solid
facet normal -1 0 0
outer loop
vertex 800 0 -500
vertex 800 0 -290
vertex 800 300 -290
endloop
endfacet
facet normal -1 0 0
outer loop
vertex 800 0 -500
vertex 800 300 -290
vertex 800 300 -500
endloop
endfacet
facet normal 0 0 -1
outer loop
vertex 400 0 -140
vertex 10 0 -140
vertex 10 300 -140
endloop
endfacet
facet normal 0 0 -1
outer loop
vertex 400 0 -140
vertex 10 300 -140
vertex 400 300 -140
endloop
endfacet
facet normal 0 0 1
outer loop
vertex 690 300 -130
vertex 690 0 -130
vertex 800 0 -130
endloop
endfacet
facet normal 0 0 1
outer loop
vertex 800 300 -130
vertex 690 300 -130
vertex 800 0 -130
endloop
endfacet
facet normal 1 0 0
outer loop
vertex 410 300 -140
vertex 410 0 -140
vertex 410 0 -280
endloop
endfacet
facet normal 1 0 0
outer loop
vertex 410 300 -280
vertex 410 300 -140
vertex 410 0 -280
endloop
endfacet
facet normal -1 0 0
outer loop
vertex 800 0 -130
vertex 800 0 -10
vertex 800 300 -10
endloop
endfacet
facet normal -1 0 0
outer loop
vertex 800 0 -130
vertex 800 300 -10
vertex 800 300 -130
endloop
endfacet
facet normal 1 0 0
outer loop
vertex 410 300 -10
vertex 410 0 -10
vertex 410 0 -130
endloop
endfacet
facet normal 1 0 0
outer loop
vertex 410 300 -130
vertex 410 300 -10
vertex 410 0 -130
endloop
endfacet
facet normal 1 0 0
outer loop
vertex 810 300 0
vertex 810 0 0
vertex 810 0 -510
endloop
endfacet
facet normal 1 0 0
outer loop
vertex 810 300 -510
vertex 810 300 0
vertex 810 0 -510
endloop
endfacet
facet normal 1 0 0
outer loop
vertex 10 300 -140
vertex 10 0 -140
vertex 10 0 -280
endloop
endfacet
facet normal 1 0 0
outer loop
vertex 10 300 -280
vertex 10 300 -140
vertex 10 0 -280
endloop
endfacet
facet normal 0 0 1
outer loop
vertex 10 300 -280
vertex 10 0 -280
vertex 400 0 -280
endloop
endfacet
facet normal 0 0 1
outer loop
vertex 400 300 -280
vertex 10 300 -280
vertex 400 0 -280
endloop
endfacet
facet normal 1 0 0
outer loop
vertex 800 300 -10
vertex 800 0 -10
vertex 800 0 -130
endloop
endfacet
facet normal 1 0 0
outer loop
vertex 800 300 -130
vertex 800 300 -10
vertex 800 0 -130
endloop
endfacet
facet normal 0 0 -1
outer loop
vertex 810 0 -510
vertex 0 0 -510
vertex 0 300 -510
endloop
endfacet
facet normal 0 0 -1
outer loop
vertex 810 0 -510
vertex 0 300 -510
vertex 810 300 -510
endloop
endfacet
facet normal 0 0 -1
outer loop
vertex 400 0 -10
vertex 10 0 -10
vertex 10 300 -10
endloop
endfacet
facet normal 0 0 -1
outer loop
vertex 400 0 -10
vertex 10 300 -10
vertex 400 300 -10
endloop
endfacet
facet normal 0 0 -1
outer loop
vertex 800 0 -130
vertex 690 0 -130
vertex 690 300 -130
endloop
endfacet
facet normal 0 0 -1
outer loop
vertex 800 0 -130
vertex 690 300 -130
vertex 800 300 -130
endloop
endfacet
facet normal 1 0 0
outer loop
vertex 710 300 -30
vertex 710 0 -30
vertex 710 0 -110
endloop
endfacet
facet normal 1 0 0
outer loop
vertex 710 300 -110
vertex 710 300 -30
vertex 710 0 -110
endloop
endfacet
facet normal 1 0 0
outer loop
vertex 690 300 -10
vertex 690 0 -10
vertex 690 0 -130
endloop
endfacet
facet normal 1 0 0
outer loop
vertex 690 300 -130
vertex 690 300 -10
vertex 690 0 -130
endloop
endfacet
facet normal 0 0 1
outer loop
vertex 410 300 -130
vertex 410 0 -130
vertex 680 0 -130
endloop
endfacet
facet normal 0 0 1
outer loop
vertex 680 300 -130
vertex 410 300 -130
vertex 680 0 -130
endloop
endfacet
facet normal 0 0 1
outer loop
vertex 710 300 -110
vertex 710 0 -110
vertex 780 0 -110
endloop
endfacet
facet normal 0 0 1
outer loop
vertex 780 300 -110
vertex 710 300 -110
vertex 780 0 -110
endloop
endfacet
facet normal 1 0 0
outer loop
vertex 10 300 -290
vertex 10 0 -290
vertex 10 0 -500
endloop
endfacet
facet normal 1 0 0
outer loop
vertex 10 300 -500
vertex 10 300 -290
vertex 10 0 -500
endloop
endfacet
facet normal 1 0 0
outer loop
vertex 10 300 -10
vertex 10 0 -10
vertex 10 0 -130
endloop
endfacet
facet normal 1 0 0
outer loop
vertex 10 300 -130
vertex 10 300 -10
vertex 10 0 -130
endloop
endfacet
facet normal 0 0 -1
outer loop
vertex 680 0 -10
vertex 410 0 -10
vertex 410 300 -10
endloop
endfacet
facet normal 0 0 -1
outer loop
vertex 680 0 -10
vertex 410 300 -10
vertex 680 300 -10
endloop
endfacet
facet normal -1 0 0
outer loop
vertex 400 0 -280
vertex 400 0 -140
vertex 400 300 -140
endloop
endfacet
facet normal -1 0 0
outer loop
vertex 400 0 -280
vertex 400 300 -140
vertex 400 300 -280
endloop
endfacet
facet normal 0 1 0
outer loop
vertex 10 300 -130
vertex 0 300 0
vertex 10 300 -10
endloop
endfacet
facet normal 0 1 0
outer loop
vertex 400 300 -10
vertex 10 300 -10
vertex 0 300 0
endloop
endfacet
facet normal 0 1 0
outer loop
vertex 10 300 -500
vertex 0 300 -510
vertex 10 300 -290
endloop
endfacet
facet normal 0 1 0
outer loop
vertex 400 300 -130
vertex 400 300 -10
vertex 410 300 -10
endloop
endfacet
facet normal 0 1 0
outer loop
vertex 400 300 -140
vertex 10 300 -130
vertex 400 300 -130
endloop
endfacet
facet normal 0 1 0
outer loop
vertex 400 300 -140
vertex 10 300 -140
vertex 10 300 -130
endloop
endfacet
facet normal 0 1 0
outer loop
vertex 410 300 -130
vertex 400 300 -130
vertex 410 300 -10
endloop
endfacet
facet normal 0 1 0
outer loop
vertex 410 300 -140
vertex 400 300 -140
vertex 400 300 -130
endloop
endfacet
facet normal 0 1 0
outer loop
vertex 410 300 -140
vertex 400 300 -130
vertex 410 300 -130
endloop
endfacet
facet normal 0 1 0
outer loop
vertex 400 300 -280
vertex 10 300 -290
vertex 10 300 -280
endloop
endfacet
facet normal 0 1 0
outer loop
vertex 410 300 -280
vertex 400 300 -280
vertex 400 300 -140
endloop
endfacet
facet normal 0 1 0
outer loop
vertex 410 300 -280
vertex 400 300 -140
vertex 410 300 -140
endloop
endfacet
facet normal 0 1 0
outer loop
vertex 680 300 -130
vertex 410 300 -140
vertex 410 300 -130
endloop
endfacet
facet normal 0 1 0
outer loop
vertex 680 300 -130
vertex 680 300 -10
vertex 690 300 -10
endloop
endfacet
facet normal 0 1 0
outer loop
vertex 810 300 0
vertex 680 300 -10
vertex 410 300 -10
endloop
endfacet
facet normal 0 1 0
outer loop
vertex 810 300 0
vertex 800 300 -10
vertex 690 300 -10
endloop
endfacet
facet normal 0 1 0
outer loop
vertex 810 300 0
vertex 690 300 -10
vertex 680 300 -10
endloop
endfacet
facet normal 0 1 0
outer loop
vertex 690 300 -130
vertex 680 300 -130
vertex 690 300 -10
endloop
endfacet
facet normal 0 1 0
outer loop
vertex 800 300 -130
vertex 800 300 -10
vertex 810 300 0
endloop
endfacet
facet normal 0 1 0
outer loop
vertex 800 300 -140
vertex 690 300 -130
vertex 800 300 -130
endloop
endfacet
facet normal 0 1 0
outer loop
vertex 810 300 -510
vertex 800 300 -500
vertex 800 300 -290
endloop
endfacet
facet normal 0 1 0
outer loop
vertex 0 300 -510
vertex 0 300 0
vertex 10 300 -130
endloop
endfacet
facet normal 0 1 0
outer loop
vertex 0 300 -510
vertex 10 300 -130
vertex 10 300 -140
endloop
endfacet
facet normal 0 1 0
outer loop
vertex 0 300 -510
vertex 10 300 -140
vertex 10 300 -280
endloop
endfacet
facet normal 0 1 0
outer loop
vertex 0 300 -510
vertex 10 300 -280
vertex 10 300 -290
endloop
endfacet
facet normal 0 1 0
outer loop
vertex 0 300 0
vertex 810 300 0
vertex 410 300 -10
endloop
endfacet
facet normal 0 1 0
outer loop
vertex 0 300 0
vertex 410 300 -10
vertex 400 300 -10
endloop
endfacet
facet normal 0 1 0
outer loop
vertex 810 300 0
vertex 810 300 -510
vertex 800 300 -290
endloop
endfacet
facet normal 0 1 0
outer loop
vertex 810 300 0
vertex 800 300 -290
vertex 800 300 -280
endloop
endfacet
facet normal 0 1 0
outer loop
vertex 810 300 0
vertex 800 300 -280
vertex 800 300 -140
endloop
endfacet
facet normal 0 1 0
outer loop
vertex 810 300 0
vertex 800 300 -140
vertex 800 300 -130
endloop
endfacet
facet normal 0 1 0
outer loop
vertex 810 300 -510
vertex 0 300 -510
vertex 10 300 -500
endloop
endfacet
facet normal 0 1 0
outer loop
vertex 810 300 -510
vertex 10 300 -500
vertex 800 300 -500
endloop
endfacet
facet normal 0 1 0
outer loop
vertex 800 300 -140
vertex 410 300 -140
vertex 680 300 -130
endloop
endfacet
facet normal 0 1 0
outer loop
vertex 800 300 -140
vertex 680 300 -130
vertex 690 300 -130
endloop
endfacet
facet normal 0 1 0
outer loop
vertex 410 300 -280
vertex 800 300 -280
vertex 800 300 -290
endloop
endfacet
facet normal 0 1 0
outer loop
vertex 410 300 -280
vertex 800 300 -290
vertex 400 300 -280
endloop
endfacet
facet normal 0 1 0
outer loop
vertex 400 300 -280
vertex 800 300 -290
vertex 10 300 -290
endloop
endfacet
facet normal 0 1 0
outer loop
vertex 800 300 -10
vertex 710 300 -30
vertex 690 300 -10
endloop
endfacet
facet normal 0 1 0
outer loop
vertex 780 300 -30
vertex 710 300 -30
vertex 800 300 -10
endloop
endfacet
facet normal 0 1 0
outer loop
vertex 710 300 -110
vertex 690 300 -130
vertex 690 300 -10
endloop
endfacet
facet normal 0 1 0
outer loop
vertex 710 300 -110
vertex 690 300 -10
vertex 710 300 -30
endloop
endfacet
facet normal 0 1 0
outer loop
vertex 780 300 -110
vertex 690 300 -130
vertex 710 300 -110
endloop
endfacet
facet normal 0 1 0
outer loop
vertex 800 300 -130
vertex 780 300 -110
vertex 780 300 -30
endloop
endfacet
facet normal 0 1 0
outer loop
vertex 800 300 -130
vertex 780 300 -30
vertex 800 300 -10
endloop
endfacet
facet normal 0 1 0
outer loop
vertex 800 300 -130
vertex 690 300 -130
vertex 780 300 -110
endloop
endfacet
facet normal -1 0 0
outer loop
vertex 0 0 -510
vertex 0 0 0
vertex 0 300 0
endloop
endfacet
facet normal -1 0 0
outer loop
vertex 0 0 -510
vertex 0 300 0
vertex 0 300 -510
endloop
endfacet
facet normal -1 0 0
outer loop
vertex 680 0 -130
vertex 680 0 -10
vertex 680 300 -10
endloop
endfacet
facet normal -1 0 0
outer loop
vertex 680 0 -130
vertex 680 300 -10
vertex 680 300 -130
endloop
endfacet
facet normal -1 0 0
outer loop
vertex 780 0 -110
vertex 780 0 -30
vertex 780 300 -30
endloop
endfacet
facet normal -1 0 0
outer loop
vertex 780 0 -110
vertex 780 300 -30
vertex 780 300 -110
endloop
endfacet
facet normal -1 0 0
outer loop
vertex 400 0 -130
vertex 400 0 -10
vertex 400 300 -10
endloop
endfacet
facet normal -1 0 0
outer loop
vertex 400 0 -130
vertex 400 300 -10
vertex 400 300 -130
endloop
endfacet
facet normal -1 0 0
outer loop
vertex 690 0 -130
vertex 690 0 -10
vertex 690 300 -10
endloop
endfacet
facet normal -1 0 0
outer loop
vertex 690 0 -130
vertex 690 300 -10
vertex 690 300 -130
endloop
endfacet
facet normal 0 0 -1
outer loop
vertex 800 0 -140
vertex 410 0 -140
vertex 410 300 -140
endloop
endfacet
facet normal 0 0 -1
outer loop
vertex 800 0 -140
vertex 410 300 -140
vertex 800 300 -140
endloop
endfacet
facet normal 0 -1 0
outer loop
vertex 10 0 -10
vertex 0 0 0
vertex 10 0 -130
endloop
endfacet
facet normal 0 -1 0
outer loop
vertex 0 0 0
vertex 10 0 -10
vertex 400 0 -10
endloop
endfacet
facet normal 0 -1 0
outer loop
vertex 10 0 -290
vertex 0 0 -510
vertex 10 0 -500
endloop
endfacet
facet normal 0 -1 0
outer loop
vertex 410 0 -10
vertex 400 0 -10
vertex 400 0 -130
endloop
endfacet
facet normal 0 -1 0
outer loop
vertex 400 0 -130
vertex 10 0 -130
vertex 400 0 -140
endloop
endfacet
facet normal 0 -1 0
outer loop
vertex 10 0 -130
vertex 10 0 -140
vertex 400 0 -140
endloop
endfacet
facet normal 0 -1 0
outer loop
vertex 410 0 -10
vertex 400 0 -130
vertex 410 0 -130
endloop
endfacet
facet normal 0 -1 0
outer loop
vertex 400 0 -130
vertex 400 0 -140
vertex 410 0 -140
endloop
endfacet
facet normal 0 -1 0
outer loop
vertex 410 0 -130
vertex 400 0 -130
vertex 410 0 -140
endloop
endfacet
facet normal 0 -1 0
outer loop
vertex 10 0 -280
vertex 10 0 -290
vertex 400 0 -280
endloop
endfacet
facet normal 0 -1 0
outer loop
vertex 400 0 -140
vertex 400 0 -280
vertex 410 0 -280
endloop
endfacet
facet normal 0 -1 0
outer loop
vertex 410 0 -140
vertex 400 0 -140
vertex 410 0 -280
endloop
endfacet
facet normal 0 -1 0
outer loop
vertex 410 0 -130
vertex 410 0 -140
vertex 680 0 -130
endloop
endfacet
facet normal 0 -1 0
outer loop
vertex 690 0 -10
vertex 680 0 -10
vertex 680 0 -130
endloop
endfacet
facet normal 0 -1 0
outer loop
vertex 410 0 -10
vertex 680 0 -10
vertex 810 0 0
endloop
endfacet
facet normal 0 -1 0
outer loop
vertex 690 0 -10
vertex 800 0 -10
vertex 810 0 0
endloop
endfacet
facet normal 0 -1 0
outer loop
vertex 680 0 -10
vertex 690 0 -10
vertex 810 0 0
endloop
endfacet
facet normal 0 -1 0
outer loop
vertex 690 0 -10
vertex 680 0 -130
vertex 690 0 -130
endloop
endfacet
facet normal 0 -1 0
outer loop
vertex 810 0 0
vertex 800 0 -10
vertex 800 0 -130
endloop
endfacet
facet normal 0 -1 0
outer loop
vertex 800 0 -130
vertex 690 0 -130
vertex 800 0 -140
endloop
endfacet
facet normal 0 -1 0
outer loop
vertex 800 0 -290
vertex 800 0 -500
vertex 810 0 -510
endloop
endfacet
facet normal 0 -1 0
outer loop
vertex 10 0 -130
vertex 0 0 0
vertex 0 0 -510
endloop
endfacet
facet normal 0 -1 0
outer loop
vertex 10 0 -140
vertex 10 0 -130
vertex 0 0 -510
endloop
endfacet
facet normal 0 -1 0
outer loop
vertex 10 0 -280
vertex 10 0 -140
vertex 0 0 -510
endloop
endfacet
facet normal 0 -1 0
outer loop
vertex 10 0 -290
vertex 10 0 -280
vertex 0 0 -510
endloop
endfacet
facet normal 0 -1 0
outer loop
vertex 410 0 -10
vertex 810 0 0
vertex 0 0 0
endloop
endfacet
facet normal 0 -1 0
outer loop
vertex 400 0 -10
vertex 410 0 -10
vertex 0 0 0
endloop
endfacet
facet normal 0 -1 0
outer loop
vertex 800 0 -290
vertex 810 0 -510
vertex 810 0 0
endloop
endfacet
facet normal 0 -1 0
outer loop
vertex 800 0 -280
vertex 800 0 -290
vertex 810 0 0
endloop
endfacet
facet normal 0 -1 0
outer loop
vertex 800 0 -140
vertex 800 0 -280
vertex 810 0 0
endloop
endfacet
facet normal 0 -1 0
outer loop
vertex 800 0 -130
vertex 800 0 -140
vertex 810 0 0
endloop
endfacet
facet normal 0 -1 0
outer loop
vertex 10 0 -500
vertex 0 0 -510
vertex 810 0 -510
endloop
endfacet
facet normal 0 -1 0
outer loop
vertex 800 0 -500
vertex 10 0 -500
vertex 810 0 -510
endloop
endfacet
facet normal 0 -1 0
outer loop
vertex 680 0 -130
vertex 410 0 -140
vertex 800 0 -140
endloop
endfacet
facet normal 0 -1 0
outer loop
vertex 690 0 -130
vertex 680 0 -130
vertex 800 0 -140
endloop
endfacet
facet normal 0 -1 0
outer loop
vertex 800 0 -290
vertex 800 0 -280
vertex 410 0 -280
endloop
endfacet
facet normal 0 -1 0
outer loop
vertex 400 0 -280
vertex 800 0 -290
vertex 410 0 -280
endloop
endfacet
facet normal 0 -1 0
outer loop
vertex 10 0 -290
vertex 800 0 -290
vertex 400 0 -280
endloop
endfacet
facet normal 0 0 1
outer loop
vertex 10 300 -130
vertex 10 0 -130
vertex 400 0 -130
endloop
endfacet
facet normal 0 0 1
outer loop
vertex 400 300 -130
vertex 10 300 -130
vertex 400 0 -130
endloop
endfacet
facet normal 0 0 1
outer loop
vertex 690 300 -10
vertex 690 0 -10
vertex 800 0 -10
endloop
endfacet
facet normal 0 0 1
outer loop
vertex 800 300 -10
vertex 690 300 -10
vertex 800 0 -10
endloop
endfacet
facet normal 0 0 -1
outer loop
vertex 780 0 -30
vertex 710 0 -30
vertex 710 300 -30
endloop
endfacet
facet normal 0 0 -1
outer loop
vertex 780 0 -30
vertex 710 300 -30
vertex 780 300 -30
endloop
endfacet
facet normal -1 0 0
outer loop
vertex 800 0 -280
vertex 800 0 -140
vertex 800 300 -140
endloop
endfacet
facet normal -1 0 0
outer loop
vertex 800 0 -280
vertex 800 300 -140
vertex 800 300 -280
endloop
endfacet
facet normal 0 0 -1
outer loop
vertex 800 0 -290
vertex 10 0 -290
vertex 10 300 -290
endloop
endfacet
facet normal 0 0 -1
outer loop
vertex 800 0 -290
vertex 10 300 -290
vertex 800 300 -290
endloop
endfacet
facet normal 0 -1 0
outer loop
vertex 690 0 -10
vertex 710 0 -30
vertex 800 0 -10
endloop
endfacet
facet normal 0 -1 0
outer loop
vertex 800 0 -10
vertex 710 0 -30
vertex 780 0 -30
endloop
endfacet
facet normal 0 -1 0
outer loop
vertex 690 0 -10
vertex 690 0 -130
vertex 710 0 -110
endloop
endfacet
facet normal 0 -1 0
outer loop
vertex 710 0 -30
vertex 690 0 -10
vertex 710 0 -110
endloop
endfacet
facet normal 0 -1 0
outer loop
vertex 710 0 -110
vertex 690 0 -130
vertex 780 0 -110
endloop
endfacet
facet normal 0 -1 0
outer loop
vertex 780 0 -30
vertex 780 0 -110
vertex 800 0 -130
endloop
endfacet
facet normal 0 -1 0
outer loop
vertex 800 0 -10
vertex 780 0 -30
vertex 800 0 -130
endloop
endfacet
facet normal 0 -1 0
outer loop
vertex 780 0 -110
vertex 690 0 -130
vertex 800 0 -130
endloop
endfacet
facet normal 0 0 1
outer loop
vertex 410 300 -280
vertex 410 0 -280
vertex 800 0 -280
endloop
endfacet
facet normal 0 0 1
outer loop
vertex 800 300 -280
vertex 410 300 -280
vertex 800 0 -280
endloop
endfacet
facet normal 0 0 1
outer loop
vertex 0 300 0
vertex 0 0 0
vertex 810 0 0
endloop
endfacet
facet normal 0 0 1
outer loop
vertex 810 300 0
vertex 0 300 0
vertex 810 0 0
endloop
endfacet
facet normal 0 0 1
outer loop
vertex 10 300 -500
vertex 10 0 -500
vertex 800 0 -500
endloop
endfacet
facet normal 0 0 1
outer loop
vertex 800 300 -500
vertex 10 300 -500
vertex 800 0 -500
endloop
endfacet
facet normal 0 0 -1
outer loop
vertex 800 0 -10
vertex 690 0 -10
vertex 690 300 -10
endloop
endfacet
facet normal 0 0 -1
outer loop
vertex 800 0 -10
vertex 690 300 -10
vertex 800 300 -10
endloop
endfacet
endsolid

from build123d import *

# Parameters (mm, degrees)
SKETCH_1_W         = 810
SKETCH_1_H         = 510
SKETCH_1_W_2       = 790
SKETCH_1_H_2       = 210
SKETCH_1_W_3       = 390
SKETCH_1_H_3       = 120
SKETCH_1_H_4       = 140
SKETCH_1_W_4       = 270
SKETCH_1_W_5       = 110
EXTRUDE_772_DEPTH  = 300
SKETCH_3_W         = 110
SKETCH_3_H         = 120
SKETCH_3_W_2       = 70
SKETCH_3_H_2       = 80
EXTRUDE_1059_DEPTH = 300


with BuildPart() as part:
    # 草图1 → Extrude 772 (new body)
    with BuildSketch(Plane(origin=(0, 0, 0), x_dir=(1, 0, 0), z_dir=(0, 1, 0))):
        with Locations((405, 255)):
            Rectangle(SKETCH_1_W, SKETCH_1_H)
        with Locations((405, 395)):
            Rectangle(SKETCH_1_W_2, SKETCH_1_H_2, mode=Mode.SUBTRACT)
        with Locations((205, 70)):
            Rectangle(SKETCH_1_W_3, SKETCH_1_H_3, mode=Mode.SUBTRACT)
        with Locations((205, 210)):
            Rectangle(SKETCH_1_W_3, SKETCH_1_H_4, mode=Mode.SUBTRACT)
        with Locations((605, 210)):
            Rectangle(SKETCH_1_W_3, SKETCH_1_H_4, mode=Mode.SUBTRACT)
        with Locations((545, 70)):
            Rectangle(SKETCH_1_W_4, SKETCH_1_H_3, mode=Mode.SUBTRACT)
        with Locations((745, 70)):
            Rectangle(SKETCH_1_W_5, SKETCH_1_H_3, mode=Mode.SUBTRACT)
    extrude(amount=EXTRUDE_772_DEPTH)


with BuildPart() as body_2:
    # 草图3 → Extrude 1059 (new body)
    with BuildSketch(Plane(origin=(0, 0, 0), x_dir=(1, 0, 0), z_dir=(0, 1, 0))):
        with Locations((745, 70)):
            Rectangle(SKETCH_3_W, SKETCH_3_H)
        with Locations((745, 70)):
            Rectangle(SKETCH_3_W_2, SKETCH_3_H_2, mode=Mode.SUBTRACT)
    extrude(amount=EXTRUDE_1059_DEPTH)


solid = Compound([part.part, body_2.part])
